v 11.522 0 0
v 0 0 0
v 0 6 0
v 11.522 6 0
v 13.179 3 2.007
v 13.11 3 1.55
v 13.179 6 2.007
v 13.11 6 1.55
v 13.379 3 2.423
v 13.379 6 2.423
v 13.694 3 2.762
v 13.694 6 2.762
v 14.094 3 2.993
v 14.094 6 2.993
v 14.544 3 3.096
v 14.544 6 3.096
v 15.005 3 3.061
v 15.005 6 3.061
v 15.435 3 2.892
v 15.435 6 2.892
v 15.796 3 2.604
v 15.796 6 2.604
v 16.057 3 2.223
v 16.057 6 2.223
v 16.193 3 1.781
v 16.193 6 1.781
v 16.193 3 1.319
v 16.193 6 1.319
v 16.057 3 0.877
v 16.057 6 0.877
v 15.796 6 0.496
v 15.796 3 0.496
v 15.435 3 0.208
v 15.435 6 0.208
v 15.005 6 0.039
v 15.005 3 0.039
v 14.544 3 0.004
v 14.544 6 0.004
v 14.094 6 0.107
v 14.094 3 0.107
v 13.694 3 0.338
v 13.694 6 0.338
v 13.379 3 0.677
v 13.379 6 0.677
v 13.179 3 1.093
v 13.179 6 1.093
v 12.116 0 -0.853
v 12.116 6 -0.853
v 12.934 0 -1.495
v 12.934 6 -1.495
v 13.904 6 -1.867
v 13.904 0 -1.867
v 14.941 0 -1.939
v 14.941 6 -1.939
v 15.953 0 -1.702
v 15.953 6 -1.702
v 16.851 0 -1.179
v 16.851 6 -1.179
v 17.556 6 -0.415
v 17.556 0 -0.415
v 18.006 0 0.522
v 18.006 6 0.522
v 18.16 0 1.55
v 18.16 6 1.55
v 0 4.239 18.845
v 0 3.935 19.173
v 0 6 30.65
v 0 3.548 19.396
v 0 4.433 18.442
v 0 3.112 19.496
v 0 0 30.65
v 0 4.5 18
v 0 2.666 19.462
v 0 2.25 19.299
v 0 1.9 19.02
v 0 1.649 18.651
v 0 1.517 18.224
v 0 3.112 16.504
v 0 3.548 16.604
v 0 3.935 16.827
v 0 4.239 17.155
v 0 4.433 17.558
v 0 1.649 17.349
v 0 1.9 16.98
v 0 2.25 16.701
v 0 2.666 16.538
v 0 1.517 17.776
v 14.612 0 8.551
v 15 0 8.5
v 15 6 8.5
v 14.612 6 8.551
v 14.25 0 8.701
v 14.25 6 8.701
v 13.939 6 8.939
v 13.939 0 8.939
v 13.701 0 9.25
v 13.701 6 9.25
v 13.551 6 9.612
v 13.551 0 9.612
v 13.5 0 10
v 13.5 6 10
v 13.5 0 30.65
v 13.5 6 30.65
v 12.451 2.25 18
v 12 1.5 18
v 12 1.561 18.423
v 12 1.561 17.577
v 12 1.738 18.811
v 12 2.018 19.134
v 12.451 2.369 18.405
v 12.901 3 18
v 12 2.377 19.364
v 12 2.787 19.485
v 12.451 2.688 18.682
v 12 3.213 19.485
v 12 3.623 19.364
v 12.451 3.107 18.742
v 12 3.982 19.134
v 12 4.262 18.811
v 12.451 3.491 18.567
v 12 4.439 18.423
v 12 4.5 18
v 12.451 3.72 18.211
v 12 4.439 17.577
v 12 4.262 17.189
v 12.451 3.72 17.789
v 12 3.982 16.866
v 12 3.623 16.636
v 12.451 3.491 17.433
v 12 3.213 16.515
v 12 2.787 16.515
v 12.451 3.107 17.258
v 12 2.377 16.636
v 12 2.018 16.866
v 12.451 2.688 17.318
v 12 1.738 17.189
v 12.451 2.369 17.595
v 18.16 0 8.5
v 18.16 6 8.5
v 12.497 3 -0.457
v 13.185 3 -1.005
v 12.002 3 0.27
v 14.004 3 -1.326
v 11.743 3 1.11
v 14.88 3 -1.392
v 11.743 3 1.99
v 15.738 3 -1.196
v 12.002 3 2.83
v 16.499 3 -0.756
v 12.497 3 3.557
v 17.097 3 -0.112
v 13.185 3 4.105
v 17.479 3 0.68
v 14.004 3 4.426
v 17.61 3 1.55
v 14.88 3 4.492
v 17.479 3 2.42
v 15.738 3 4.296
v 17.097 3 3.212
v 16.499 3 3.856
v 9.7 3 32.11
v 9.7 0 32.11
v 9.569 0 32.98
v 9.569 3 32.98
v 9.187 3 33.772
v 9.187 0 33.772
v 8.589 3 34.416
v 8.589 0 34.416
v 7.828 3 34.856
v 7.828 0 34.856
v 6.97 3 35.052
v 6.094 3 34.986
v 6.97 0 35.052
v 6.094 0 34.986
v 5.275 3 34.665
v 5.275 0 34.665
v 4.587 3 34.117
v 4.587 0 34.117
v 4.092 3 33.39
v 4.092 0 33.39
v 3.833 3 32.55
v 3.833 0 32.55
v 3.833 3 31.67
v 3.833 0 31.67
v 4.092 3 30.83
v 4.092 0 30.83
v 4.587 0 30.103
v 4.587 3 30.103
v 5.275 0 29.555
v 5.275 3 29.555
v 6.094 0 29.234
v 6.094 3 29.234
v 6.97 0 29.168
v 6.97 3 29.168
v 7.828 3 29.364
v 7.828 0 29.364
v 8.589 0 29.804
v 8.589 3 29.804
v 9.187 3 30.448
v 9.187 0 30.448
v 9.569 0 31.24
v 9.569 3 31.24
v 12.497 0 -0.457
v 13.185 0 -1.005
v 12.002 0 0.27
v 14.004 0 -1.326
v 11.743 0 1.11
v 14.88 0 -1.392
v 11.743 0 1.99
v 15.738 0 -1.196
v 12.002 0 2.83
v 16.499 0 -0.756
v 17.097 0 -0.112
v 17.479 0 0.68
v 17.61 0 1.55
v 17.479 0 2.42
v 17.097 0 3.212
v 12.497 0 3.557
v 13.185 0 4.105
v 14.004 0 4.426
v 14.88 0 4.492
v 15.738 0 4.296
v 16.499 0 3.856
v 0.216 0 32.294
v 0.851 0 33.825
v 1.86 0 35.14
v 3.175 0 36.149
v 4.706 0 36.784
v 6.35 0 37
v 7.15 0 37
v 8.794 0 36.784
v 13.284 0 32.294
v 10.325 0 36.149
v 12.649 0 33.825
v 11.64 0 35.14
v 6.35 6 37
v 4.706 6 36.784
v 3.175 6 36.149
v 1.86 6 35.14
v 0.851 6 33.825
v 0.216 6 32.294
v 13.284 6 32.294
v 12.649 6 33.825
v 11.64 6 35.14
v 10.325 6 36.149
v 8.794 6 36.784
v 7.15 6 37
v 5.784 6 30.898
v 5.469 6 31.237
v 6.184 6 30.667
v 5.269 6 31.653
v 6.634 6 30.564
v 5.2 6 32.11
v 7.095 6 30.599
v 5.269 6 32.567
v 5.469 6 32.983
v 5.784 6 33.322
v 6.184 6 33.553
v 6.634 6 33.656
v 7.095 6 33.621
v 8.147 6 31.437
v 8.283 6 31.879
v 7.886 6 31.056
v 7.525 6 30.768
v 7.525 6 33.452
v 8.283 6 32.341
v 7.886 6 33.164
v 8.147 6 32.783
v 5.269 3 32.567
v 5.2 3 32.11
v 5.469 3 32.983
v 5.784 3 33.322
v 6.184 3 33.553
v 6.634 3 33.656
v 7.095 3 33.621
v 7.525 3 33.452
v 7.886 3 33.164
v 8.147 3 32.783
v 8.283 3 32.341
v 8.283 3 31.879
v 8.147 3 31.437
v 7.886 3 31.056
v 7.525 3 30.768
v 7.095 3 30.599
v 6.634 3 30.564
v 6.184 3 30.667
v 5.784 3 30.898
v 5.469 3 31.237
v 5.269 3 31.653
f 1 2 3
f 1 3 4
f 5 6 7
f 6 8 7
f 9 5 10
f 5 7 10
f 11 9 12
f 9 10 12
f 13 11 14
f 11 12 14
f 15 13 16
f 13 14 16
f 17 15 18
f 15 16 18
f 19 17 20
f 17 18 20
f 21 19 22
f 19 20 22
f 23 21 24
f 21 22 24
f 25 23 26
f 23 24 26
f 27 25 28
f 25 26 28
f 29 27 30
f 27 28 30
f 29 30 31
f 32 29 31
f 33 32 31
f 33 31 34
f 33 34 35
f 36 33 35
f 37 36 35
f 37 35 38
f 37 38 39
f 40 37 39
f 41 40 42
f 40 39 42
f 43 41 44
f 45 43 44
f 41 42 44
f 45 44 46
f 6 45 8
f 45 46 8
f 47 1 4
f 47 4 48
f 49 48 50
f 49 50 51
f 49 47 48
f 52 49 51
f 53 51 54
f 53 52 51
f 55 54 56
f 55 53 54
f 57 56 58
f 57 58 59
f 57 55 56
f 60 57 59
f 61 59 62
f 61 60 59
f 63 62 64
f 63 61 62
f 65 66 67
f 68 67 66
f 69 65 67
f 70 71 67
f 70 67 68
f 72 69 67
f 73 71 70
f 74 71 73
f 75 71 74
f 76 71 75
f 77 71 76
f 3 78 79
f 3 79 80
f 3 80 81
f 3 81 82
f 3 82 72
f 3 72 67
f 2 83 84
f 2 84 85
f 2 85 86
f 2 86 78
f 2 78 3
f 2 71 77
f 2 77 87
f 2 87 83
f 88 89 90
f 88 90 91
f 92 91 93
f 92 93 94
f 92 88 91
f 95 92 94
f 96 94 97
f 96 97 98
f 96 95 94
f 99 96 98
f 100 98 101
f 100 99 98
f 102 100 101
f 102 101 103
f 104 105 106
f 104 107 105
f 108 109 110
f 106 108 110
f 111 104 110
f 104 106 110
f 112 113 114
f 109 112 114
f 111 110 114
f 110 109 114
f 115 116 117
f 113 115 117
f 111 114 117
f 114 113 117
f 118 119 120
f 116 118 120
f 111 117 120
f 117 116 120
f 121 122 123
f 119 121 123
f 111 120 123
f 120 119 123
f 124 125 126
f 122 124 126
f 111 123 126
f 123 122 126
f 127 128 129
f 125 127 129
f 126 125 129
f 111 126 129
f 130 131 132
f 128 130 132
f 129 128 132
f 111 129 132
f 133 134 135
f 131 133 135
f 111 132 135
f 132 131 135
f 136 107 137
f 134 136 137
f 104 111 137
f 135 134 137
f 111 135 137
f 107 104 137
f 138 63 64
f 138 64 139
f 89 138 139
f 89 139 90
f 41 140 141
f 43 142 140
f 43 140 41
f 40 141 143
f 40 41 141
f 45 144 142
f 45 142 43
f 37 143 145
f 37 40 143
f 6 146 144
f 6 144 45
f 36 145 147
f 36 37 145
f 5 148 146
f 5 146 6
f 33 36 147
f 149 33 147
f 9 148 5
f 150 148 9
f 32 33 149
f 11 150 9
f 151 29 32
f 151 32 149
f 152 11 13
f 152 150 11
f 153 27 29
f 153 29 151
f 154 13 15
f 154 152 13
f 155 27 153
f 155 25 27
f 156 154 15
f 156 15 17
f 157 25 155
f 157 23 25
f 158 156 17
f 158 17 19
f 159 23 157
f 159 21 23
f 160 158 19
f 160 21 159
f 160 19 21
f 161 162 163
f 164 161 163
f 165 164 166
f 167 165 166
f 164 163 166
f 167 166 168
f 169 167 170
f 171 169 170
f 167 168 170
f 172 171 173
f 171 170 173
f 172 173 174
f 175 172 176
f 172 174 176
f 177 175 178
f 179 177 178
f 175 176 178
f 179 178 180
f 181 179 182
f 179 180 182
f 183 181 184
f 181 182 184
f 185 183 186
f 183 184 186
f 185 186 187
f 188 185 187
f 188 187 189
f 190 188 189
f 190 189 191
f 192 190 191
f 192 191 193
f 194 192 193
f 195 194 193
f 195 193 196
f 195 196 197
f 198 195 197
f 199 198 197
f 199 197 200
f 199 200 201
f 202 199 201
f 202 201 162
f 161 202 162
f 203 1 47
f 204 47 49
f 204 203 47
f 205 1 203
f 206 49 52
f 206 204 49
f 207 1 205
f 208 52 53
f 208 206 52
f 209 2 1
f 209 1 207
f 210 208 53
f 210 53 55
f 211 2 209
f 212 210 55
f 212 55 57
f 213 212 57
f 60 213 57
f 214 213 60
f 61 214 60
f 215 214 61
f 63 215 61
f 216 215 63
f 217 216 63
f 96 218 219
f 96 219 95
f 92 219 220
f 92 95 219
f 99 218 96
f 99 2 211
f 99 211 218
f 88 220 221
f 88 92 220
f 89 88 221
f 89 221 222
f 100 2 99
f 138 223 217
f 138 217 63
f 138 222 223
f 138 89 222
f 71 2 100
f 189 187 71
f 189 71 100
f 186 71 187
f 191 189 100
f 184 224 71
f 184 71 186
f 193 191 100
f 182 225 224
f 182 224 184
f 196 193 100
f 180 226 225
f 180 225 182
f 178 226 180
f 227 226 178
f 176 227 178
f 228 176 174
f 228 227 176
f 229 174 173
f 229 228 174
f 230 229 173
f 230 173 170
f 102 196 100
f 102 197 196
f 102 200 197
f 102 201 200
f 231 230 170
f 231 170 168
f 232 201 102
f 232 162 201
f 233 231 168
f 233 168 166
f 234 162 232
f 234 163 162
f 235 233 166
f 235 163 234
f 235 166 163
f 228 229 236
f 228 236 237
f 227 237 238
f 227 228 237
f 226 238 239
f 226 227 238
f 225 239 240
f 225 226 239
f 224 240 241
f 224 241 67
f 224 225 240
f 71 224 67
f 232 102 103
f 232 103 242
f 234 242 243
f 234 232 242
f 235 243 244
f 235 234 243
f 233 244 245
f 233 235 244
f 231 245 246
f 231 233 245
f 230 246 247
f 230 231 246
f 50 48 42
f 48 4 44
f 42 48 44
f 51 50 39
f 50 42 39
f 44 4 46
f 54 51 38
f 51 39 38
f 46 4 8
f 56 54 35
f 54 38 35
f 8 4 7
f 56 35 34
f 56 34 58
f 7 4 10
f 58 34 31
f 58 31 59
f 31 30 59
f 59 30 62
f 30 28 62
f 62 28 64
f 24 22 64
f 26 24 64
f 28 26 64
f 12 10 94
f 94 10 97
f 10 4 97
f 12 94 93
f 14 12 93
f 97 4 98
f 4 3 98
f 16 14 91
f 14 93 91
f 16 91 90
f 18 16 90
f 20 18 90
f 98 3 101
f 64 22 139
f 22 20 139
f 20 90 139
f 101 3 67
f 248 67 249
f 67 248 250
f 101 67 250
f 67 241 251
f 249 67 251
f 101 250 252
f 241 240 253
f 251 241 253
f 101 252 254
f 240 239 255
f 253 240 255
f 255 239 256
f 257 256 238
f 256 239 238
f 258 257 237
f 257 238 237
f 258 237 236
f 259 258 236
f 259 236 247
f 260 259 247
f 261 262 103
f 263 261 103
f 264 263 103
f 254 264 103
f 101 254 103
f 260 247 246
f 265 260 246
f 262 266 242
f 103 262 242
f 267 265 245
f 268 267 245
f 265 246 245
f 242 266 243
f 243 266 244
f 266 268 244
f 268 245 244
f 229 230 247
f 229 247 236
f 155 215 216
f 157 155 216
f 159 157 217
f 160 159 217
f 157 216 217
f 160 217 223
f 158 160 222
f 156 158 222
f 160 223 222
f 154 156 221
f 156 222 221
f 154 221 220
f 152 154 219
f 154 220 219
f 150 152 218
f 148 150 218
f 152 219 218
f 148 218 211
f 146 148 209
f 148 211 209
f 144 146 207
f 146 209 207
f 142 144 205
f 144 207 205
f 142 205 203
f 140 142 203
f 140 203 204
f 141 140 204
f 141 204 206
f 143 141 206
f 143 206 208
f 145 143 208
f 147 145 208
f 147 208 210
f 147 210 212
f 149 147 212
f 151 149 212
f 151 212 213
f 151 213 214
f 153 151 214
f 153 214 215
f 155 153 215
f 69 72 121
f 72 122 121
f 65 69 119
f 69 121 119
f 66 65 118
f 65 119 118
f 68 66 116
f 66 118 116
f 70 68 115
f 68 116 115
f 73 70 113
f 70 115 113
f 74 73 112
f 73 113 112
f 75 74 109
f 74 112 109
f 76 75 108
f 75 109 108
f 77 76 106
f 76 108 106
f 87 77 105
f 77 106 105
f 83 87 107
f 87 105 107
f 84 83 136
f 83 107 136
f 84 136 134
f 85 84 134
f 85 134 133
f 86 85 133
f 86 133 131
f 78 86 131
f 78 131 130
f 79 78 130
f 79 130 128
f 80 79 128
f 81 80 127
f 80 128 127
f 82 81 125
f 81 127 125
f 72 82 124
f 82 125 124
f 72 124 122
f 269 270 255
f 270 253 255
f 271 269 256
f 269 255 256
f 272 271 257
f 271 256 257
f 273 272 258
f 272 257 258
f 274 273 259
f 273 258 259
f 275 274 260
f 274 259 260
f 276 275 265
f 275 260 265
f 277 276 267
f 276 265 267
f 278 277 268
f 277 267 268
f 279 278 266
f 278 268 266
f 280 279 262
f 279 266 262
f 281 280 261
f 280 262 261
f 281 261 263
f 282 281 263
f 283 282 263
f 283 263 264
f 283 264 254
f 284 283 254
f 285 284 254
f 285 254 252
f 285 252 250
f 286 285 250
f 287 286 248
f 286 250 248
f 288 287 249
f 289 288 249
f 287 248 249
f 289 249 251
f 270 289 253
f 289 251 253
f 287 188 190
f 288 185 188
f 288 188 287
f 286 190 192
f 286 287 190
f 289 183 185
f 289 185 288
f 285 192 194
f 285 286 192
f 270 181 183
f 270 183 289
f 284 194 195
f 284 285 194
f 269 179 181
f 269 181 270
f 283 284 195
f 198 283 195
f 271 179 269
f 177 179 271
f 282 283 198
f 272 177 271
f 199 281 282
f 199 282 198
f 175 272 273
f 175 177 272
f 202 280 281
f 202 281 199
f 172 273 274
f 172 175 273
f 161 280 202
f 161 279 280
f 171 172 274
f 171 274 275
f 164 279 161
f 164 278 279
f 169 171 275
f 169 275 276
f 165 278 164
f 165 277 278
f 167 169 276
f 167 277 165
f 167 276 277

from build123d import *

# Parameters (mm, degrees)
F1_DEPTH       = 6
F2_D           = 3.1
F2_CBORE_D     = 5.9
F2_CBORE_DEPTH = 3
F3_D           = 3.1
F3_CBORE_D     = 5.9
F3_CBORE_DEPTH = 3
F5_D           = 3
F5_DEPTH       = 12
F5_TIP         = 0.9012909285


with BuildPart() as f1:
    # F0 (on Front) → F1 (new body)
    with BuildSketch(Plane.XZ):
        with BuildLine():
            ThreePointArc((6.35, 37), (1.8598719395, 35.1401280605), (0, 30.65))
            Line((0, 30.65), (0, 0))
            Line((0, 0), (11.5219274306, 0))
            ThreePointArc((11.5219274306, 0), (15.4558473407, -1.8583173487), (18.1600000875, 1.55))
            Line((18.1600000875, 1.55), (18.1600000875, 8.5))
            Line((18.1600000875, 8.5), (15, 8.5))
            ThreePointArc((15, 8.5), (13.9393398282, 8.9393398282), (13.5, 10))
            Line((13.5, 10), (13.5, 30.65))
            ThreePointArc((13.5, 30.65), (11.6401280605, 35.1401280605), (7.15, 37))
            Line((7.15, 37), (6.35, 37))
        make_face()
    extrude(amount=-F1_DEPTH)

    # F2 (through all)
    with Locations(Plane.XZ):
        with Locations((6.7500000875, 32.11)):
            CounterBoreHole(F2_D / 2, F2_CBORE_D / 2, F2_CBORE_DEPTH)

    # F3 (through all)
    with Locations(Plane.XZ):
        with Locations((14.6600000875, 1.55)):
            CounterBoreHole(F3_D / 2, F3_CBORE_D / 2, F3_CBORE_DEPTH)

    # F5
    with Locations(Plane(origin=(0, 0, 0), x_dir=(0, -1, 0), z_dir=(-1, 0, 0))):
        with Locations((-3, 18)):
            Hole(F5_D / 2, depth=F5_DEPTH)
            with Locations((0, 0, -(F5_DEPTH + F5_TIP / 2))):  # 118° drill point
                Cone(0, F5_D / 2, F5_TIP, mode=Mode.SUBTRACT)


solid = f1.part
